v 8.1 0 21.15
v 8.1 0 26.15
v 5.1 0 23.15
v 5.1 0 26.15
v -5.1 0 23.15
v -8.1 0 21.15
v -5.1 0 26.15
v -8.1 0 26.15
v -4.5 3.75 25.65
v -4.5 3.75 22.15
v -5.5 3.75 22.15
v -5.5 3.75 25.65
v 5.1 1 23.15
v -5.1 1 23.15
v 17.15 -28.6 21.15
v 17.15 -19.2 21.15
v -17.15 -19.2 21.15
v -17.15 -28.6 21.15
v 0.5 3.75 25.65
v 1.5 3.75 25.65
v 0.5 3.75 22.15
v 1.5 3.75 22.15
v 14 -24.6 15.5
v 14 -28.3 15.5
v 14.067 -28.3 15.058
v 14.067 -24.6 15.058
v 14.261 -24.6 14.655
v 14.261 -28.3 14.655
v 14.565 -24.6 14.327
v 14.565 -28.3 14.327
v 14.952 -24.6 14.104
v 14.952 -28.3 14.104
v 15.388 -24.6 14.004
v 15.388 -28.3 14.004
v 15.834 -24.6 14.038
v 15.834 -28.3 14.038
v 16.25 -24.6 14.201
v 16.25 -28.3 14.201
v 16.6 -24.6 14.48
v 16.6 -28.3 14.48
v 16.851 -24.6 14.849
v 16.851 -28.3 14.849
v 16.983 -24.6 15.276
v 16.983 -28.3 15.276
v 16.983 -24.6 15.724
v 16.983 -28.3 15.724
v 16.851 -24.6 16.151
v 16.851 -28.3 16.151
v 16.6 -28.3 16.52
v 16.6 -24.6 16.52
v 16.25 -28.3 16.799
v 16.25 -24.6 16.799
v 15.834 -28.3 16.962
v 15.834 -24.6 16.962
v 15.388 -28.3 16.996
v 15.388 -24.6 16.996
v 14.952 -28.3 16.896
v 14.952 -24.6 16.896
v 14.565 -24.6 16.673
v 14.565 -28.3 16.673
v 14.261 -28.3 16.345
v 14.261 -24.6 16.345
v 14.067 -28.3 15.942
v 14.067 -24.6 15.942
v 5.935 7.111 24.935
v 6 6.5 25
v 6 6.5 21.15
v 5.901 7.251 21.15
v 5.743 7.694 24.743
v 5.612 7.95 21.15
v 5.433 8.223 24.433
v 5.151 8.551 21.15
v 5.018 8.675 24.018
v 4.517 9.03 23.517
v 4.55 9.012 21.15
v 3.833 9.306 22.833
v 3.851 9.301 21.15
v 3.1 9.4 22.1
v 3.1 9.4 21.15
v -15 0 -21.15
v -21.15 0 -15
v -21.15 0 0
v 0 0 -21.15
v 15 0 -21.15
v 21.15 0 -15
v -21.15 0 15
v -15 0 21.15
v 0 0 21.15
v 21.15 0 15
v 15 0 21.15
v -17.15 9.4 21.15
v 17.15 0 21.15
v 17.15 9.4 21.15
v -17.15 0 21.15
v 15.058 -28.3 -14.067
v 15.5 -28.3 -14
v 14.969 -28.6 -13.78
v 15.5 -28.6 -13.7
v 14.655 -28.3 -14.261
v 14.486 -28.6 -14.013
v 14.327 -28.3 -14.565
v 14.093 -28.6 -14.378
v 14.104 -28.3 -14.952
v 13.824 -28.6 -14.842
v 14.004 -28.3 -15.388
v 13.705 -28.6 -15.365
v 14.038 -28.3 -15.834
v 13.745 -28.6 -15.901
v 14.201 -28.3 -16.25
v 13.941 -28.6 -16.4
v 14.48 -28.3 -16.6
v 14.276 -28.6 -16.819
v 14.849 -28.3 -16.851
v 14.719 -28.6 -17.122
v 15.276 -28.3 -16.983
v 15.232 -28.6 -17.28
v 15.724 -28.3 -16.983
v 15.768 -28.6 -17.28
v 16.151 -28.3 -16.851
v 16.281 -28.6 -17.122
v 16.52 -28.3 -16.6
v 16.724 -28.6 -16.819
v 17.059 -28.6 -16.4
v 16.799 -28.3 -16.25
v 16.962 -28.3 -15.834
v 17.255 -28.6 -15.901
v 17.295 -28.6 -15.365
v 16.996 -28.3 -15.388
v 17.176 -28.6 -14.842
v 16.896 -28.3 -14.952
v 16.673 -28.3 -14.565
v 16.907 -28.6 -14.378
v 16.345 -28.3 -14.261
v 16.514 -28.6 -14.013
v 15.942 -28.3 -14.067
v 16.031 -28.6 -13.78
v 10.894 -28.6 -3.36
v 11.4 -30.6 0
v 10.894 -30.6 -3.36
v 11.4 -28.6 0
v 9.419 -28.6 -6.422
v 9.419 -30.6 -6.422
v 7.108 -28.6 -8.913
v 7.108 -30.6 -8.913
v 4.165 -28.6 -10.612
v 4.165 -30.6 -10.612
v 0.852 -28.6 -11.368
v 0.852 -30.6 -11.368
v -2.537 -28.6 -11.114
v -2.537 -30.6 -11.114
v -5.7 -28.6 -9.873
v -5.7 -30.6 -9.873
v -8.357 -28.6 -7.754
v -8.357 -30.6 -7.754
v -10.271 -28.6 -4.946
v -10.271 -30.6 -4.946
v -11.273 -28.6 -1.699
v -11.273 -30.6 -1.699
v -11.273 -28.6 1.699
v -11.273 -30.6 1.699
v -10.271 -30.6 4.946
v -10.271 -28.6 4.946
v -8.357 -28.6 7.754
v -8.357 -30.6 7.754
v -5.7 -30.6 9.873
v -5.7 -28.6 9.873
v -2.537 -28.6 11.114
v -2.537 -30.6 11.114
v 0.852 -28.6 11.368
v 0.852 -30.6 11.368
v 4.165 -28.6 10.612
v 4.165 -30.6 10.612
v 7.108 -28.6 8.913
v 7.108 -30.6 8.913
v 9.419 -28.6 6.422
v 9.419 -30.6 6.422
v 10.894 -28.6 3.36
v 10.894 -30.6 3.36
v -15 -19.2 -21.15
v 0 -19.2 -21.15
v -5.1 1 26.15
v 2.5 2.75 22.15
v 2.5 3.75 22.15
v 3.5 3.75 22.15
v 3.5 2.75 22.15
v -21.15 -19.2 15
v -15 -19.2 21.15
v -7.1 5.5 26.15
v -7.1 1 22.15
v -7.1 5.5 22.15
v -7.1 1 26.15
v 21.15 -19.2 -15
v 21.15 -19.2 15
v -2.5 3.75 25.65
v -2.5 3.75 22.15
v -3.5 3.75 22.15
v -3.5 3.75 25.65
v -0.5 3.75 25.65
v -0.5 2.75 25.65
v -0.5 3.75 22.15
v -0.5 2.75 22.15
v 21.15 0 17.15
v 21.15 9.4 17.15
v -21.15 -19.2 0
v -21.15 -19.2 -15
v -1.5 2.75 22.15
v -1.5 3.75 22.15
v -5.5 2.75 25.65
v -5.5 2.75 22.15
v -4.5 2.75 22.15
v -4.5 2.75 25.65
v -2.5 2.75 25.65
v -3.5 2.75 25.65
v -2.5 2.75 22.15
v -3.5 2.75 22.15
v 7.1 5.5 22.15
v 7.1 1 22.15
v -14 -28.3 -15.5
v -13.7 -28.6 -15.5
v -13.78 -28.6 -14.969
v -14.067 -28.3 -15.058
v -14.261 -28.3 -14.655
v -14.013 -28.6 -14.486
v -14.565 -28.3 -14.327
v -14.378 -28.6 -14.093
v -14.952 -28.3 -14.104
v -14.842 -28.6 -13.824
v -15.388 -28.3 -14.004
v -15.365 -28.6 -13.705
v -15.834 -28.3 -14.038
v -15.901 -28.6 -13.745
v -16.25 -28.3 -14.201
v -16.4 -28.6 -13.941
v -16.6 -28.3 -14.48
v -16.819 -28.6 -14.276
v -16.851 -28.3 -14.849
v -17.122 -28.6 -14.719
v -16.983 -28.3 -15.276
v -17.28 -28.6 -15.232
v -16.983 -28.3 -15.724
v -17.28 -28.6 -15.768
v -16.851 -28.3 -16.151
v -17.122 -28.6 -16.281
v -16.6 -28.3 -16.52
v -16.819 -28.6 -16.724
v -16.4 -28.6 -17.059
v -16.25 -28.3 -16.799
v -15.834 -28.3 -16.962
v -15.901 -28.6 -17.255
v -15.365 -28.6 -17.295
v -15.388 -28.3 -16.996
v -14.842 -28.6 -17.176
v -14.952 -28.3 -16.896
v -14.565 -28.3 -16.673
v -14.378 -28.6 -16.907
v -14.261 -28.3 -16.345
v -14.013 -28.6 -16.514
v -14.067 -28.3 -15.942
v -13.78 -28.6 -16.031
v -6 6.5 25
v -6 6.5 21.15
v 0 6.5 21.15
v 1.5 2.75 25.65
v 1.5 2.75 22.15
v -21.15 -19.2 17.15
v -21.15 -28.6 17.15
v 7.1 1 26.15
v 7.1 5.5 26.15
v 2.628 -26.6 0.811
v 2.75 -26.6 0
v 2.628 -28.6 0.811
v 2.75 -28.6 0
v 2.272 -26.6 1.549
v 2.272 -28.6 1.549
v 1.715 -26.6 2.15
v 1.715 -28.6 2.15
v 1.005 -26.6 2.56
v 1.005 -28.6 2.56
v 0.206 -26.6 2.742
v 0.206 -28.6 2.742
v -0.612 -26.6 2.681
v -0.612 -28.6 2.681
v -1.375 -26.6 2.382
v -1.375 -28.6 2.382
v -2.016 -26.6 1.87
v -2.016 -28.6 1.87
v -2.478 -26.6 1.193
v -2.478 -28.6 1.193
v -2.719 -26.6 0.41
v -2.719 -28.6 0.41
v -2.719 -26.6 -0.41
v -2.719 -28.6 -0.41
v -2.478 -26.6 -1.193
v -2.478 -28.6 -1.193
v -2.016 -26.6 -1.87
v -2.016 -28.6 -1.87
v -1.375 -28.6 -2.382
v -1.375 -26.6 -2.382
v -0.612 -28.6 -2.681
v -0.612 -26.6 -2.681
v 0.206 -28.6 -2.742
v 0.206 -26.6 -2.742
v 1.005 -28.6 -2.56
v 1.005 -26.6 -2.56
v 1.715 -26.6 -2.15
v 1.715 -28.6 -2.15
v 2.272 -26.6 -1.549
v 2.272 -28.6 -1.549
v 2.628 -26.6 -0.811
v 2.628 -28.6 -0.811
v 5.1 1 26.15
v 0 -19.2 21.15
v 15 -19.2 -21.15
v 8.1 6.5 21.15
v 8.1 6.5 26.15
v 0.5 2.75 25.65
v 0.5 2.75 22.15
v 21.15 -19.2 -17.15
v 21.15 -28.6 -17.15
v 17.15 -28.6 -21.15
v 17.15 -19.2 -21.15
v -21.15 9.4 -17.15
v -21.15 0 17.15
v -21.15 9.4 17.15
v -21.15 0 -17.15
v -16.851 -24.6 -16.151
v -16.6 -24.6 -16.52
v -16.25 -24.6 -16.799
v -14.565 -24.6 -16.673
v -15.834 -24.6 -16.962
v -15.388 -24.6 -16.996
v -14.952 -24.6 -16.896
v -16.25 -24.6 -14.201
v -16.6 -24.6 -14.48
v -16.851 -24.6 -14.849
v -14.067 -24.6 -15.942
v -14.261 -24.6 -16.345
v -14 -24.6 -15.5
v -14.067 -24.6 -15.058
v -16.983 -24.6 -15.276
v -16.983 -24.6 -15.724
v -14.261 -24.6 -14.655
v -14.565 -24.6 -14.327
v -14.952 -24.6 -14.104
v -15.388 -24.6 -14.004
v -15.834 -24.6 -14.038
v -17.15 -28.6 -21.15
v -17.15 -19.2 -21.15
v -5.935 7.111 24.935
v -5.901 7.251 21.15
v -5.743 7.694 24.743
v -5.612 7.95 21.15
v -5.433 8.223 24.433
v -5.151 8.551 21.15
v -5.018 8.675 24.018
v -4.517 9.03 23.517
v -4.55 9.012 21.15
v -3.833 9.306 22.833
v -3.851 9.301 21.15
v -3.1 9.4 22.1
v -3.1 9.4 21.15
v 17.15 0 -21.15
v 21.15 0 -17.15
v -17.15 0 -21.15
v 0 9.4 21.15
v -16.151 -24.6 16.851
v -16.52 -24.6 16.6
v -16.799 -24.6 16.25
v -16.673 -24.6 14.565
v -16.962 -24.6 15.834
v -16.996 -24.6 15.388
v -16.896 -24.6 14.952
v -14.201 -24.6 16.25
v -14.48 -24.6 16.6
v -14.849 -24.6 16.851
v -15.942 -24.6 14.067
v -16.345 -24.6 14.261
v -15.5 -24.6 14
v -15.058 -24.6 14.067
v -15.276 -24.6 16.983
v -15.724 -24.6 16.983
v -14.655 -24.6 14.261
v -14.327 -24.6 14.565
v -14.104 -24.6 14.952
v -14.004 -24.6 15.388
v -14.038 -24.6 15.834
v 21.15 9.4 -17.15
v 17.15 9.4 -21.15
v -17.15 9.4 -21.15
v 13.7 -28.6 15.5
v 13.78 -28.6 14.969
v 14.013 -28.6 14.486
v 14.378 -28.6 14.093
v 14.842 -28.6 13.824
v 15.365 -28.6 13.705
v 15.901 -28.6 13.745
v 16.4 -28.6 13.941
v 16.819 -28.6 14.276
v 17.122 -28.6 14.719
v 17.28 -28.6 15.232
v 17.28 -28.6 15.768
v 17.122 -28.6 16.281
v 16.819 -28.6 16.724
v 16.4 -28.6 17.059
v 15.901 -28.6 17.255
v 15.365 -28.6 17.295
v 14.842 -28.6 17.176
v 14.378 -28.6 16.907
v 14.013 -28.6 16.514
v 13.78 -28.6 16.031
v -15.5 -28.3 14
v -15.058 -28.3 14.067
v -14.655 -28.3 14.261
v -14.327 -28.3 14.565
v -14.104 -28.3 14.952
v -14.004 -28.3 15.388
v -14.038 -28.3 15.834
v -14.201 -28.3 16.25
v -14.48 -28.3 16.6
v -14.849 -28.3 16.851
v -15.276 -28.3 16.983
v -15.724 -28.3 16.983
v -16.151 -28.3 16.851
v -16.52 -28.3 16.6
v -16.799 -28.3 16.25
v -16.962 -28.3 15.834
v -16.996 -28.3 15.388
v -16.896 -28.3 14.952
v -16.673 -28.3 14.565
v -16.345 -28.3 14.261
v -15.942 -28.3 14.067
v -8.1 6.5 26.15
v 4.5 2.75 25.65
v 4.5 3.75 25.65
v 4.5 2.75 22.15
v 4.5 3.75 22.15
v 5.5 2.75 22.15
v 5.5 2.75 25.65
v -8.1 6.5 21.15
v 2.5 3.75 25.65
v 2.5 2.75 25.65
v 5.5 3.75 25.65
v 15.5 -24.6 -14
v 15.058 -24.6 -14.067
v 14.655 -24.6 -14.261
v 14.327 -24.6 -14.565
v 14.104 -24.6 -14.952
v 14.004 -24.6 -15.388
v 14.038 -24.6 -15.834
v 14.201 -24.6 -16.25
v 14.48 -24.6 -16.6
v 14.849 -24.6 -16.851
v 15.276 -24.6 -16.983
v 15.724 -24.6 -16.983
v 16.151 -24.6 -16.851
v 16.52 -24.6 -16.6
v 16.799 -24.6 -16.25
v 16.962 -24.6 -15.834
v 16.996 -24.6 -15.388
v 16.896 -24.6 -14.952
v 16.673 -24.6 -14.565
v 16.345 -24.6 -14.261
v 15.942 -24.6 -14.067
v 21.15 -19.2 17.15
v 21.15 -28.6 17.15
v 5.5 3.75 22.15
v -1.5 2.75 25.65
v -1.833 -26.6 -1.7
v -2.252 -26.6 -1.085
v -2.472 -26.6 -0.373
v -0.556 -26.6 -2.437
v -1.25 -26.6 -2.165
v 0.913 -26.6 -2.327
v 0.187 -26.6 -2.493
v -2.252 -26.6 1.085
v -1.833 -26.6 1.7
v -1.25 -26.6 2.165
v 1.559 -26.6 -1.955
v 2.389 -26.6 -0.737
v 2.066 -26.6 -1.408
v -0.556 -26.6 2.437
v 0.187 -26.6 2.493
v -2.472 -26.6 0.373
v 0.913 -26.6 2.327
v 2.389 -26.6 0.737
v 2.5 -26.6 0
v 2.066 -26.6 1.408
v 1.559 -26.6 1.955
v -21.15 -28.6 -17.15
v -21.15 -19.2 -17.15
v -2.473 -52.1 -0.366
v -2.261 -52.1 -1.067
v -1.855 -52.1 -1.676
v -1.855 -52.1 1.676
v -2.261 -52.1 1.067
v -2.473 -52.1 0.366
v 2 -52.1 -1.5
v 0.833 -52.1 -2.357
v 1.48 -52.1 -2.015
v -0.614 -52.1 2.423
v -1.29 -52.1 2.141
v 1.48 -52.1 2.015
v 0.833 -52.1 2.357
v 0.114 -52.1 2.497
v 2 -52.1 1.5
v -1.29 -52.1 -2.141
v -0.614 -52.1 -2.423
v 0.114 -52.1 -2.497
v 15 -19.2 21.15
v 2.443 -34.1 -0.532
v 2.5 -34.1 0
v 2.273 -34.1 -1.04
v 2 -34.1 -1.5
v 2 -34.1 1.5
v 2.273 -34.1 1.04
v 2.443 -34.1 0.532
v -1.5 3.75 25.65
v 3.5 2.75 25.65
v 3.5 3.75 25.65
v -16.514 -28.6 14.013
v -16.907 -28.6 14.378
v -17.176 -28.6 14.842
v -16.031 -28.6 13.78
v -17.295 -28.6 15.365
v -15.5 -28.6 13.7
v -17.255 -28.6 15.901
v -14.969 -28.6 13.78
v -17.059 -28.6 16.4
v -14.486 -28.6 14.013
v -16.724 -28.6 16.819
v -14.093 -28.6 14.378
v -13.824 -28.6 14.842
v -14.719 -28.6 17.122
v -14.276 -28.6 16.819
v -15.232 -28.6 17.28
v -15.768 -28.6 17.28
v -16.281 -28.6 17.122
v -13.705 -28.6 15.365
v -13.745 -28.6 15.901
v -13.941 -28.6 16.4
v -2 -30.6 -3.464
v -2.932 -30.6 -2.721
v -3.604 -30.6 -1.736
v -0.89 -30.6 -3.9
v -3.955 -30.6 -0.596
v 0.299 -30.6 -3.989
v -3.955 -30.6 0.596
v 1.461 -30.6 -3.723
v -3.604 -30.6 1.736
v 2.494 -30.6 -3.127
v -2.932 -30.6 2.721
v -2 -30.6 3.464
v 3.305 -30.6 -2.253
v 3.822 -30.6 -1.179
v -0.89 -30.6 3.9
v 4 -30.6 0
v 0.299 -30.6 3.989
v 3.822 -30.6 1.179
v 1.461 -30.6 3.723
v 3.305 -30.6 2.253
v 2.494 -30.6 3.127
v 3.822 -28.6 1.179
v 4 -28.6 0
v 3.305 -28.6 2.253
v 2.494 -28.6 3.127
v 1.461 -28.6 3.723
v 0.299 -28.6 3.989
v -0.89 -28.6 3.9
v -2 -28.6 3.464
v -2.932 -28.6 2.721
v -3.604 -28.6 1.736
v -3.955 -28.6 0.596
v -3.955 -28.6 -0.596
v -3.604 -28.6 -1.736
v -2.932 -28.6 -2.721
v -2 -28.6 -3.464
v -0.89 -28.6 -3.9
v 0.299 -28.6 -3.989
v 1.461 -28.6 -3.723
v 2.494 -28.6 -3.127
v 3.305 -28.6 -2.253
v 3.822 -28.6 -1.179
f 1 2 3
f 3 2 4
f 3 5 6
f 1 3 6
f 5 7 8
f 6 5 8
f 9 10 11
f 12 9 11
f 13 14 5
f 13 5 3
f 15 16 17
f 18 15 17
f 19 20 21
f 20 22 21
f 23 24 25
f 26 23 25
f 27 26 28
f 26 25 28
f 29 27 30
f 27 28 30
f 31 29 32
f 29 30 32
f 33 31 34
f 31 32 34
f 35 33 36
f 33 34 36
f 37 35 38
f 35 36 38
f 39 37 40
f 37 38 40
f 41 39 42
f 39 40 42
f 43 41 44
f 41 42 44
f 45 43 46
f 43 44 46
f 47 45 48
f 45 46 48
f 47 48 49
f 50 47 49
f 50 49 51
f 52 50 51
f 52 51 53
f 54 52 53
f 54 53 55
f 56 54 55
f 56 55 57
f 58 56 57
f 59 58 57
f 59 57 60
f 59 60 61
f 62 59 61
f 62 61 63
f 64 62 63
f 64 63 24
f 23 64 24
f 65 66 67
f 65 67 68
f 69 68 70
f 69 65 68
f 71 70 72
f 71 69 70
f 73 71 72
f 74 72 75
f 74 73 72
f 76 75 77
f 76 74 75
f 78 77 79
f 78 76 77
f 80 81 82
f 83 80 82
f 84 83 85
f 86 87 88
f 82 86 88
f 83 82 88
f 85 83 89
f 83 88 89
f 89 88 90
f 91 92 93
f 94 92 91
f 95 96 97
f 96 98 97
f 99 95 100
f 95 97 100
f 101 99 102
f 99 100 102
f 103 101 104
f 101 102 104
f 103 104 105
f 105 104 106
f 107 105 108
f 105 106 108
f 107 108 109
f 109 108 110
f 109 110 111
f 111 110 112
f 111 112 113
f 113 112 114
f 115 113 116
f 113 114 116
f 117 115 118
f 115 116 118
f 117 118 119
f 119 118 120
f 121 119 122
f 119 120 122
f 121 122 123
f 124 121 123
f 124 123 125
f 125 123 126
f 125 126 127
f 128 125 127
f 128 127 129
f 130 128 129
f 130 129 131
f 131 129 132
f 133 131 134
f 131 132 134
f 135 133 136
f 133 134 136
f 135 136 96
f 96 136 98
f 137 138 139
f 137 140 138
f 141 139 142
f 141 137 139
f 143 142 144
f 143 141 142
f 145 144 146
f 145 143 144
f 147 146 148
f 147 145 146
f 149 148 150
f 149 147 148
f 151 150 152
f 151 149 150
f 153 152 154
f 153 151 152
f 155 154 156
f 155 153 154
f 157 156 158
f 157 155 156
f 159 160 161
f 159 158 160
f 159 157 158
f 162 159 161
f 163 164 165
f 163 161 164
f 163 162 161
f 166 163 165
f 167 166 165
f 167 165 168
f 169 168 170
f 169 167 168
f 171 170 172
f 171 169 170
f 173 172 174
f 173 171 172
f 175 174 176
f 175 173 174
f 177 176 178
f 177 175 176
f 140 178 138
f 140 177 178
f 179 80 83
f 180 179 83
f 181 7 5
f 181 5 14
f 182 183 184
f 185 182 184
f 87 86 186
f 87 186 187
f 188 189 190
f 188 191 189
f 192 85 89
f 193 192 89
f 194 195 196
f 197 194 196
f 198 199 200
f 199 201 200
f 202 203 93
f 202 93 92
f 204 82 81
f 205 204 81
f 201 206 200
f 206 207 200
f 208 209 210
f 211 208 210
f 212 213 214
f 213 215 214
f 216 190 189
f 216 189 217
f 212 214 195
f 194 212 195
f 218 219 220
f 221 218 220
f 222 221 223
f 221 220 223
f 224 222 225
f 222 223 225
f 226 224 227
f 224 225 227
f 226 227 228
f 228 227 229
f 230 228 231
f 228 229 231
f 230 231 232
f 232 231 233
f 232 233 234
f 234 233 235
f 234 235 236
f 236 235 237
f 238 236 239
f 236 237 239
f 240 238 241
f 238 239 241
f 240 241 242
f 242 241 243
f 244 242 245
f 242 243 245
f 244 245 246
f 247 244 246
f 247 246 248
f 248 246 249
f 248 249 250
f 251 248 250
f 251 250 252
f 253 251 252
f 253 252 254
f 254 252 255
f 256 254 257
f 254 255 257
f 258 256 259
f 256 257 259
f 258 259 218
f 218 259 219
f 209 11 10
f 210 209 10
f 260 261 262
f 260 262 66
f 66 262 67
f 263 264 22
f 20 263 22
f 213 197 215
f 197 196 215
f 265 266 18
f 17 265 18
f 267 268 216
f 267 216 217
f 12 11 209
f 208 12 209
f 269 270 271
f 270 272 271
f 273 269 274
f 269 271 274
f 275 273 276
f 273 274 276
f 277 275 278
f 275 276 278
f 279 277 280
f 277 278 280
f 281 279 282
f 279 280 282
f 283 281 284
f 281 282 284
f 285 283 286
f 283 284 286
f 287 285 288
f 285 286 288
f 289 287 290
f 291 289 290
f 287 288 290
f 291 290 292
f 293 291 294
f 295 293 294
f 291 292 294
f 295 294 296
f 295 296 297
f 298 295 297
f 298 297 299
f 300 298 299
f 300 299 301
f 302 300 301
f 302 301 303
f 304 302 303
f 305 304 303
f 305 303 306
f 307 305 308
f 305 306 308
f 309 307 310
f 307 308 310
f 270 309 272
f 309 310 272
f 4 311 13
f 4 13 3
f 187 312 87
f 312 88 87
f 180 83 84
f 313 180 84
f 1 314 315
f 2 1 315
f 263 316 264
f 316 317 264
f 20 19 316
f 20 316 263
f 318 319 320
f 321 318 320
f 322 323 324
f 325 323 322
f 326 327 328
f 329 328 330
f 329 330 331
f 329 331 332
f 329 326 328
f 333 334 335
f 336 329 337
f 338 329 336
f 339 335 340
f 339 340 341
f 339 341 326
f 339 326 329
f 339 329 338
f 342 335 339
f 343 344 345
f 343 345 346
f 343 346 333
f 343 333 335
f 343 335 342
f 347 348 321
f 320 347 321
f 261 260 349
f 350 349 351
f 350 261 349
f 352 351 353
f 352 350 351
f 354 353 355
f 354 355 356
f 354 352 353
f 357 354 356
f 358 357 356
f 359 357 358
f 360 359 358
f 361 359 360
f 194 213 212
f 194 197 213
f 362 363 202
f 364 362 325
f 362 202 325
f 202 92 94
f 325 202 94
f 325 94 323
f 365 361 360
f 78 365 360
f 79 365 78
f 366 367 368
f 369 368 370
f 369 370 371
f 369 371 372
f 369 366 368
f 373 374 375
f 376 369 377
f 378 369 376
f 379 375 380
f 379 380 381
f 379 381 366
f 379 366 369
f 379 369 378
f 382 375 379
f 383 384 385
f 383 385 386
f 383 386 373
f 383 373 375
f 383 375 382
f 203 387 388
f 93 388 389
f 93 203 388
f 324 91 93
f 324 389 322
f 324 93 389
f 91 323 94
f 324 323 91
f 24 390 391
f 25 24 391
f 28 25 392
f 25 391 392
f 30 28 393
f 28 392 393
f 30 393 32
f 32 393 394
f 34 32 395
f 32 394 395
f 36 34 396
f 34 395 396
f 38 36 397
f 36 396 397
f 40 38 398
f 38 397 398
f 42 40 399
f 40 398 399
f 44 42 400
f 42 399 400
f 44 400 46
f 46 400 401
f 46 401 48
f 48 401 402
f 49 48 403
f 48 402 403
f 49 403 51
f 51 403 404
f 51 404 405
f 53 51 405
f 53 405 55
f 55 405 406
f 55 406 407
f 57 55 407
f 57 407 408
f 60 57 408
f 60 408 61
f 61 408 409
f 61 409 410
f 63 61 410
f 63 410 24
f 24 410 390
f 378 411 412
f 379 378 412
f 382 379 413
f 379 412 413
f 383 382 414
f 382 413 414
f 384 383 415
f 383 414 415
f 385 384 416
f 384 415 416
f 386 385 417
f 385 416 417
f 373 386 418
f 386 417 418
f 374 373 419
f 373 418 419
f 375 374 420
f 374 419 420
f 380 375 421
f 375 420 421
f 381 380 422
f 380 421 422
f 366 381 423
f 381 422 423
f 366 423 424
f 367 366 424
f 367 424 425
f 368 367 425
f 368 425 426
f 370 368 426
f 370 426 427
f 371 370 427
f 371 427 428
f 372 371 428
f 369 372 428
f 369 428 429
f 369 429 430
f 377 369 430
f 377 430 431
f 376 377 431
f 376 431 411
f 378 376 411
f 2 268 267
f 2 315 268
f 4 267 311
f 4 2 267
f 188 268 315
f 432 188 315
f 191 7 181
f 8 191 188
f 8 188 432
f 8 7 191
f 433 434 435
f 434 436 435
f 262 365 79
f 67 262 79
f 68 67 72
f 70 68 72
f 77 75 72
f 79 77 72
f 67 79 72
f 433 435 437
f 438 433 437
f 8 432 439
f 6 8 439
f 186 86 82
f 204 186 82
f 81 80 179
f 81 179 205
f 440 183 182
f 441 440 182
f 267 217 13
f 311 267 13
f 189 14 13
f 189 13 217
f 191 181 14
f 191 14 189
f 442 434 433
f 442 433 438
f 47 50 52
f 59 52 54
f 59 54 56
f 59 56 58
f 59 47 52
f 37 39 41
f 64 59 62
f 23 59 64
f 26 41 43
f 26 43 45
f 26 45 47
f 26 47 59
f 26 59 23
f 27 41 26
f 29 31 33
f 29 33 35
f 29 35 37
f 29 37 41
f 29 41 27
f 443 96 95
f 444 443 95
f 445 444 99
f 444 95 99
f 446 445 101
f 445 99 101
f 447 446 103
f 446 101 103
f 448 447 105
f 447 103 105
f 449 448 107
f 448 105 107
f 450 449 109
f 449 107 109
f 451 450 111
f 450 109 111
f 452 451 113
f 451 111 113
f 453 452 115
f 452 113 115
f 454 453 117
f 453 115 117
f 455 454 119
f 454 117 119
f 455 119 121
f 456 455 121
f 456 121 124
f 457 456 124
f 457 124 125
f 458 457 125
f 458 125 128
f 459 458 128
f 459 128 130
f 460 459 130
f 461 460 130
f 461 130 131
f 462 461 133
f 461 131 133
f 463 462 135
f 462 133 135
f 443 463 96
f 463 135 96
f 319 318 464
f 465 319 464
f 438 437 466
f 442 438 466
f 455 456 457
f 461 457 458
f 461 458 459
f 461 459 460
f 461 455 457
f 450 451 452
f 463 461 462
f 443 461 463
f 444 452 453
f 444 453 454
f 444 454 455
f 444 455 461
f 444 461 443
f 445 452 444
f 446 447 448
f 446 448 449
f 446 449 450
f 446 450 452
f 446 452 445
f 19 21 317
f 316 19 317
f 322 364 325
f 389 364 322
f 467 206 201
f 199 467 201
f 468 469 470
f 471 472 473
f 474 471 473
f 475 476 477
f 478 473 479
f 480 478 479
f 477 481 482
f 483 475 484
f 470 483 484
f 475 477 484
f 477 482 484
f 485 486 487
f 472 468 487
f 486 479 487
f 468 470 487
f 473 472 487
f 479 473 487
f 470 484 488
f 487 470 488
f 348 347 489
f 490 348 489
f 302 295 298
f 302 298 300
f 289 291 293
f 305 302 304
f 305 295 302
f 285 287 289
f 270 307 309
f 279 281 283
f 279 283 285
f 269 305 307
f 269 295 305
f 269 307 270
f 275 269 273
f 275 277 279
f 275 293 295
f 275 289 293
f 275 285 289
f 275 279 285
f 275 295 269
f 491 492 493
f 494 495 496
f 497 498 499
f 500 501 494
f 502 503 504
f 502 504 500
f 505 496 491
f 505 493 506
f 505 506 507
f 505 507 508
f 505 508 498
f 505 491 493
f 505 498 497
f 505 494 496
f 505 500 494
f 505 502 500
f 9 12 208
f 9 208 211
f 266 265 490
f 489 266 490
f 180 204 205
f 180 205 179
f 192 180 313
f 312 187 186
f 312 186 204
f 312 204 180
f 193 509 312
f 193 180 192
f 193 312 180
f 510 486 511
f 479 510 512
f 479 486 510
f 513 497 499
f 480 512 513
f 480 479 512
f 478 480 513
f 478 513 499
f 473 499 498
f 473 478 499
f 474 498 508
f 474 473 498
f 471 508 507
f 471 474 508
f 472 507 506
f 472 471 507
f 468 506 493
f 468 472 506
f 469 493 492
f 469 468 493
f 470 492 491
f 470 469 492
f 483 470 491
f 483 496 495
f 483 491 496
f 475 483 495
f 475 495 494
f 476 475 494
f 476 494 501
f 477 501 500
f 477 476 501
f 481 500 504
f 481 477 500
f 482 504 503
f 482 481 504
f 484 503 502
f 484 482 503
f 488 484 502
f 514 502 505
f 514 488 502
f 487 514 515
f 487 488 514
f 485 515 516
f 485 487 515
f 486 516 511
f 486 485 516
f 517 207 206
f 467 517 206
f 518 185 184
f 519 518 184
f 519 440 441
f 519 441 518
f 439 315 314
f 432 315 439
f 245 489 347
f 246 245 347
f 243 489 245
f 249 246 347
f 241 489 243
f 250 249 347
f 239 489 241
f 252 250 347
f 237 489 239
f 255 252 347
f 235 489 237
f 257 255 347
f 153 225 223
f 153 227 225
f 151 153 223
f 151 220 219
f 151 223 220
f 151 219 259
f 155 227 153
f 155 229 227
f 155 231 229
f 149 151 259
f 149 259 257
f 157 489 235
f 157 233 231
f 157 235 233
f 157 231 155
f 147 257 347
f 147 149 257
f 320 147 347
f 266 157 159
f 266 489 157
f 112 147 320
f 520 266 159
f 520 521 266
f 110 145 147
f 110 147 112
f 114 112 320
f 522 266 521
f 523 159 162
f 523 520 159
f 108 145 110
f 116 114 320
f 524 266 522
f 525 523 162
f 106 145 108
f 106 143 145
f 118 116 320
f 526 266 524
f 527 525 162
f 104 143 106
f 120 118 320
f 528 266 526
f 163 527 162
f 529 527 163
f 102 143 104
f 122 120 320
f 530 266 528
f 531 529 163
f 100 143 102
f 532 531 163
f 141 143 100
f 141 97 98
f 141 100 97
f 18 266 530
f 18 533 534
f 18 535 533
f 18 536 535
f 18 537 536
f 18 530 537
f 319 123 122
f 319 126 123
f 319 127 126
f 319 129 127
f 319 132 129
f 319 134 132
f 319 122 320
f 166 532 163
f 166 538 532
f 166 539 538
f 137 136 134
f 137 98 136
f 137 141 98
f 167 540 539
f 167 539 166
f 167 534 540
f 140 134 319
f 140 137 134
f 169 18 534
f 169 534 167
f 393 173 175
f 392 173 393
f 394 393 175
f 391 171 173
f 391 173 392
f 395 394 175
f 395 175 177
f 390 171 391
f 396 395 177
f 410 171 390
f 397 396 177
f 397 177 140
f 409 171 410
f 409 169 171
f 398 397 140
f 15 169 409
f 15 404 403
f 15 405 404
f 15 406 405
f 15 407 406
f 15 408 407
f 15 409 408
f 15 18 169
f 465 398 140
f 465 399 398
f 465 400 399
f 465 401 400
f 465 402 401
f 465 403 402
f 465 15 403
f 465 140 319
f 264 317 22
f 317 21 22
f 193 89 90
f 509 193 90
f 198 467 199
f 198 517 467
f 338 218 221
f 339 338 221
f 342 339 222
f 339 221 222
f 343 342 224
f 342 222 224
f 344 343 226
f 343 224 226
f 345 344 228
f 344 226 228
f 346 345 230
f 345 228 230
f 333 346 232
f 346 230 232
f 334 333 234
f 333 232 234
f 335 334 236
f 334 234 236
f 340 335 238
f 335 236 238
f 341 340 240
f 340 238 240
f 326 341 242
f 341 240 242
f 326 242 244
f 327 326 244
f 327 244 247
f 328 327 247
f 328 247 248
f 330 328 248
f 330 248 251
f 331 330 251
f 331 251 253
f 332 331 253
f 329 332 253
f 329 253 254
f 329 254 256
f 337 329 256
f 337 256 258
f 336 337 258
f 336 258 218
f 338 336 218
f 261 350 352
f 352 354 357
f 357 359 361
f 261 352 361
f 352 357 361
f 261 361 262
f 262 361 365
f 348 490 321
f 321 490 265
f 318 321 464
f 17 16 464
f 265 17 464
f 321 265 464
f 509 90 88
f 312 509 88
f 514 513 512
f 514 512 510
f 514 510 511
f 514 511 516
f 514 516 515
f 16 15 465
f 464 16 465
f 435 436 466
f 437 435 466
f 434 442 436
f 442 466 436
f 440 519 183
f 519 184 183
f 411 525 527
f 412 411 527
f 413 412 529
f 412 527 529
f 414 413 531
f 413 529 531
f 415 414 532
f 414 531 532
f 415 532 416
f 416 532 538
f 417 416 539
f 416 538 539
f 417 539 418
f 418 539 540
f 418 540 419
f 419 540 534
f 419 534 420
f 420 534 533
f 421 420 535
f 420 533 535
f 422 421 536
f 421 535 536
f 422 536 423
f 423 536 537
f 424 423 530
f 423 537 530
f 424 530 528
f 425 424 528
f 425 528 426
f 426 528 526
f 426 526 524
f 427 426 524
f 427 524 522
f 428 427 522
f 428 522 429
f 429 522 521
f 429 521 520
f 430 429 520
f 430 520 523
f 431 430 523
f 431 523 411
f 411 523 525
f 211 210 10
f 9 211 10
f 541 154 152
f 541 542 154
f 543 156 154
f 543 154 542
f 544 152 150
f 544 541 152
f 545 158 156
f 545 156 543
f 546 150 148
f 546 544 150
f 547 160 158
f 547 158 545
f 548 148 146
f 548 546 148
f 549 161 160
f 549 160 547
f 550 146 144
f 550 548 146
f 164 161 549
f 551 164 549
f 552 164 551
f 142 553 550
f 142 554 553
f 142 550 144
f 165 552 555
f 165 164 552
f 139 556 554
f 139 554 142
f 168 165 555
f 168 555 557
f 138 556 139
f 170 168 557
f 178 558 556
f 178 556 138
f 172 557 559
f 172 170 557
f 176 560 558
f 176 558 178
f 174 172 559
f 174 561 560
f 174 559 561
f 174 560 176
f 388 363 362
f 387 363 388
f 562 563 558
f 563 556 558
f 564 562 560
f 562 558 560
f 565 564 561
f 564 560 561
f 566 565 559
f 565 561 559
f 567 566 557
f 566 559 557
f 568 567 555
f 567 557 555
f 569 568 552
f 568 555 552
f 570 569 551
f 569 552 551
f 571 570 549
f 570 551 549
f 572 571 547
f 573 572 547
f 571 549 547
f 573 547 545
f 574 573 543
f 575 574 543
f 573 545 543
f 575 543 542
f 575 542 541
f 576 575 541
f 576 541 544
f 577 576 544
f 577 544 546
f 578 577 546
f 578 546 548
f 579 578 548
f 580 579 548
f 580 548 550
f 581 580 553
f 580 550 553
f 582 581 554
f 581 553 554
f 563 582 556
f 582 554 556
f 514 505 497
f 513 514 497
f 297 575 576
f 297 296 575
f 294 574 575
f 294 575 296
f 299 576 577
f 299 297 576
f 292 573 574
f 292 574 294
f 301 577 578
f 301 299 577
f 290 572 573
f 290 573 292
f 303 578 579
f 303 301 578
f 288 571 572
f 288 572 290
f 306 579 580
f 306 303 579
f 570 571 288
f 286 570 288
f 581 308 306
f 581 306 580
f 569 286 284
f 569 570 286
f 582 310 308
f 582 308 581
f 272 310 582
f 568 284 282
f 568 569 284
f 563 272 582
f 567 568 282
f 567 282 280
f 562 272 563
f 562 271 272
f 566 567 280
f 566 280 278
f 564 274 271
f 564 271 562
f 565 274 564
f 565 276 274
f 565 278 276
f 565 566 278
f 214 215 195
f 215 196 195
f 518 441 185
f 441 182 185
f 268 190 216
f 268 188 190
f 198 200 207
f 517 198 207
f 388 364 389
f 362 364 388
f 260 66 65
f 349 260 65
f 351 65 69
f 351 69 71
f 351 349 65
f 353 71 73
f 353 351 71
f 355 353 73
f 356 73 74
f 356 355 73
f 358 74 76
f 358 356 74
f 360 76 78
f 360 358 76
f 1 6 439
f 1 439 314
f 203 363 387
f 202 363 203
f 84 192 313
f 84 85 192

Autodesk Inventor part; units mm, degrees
ref_plane "YZ Plane" through (0, 0, 0) normal (1, 0, 0) x (0, 1, 0)
ref_plane "XZ Plane" through (0, 0, 0) normal (0, 1, 0) x (-1, 0, 0)
ref_plane "XY Plane" through (0, 0, 0) normal (0, 0, 1) x (1, 0, 0)
sketch "Szkic1" plane through (0, 0, 0) normal (0, 1, 0) x (-1, 0, 0)
  line L0 (-21.15, 21.15) -> (21.15, 21.15)
  line L1 (21.15, 21.15) -> (21.15, -21.15)
  line L2 (21.15, -21.15) -> (-21.15, -21.15)
  line L3 (-21.15, -21.15) -> (-21.15, 21.15)
  line L4 (-21.15, 21.15) -> (21.15, -21.15) construction
  line L5 (21.15, 21.15) -> (-21.15, -21.15) construction
  point P0 (0, 0)
  dimension "d0" = 42.3
  dimension "d1" = 42.3
extrude "Wyciągnięcie proste1" add sketch "Szkic1" along normal blind 9.4
chamfer "Faza1" distance 4 angle 45 4 edges at (21.15, 4.7, 21.15) (-21.15, 4.7, 21.15) (-21.15, 4.7, -21.15) (21.15, 4.7, -21.15)
sketch "Szkic2" plane through (0, 0, 0) normal (0, -1, 0) x (1, 0, 0)
  line L0 (21.15, -17.15) -> (17.15, -21.15) projected
  line L1 (21.15, -17.15) -> (21.15, 17.15) projected
  line L2 (17.15, 21.15) -> (21.15, 17.15) projected
  line L3 (17.15, 21.15) -> (-17.15, 21.15) projected
  line L4 (-21.15, 17.15) -> (-17.15, 21.15) projected
  line L5 (-21.15, 17.15) -> (-21.15, -17.15) projected
  line L6 (-17.15, -21.15) -> (-21.15, -17.15) projected
  line L7 (-17.15, -21.15) -> (17.15, -21.15) projected
  line L8 (21.15, -17.15) -> (21.15, 17.15) projected
  line L9 (21.15, 15) -> (21.15, -15)
  line L10 (17.15, -21.15) -> (-17.15, -21.15) projected
  line L11 (0, -21.15) -> (15, -21.15)
  line L12 (0, -21.15) -> (-15, -21.15)
  line L13 (-21.15, -17.15) -> (-21.15, 17.15) projected
  line L14 (-21.15, 0) -> (-21.15, -15)
  line L15 (-21.15, 0) -> (-21.15, 15)
  line L16 (-17.15, 21.15) -> (17.15, 21.15) projected
  line L17 (0, 21.15) -> (-15, 21.15)
  line L18 (0, 21.15) -> (15, 21.15)
  line L19 (21.15, 15) -> (15, 21.15)
  line L20 (21.15, -15) -> (15, -21.15)
  line L21 (-15, -21.15) -> (-21.15, -15)
  line L22 (-21.15, 15) -> (-15, 21.15)
  point P0 (0, 0)
extrude "Wyciągnięcie proste2" add sketch "Szkic2" along normal blind 19.2 separate body contours L20 L7 L21 L5 L22 L3 L19 L1
sketch "Szkic3" plane through (0, -19.2, 0) normal (0, -1, 0) x (1, 0, 0)
  line L0 (21.15, -17.15) -> (17.15, -21.15) projected
  line L1 (21.15, -17.15) -> (21.15, 17.15) projected
  line L2 (17.15, 21.15) -> (21.15, 17.15) projected
  line L3 (17.15, 21.15) -> (-17.15, 21.15) projected
  line L4 (-21.15, 17.15) -> (-17.15, 21.15) projected
  line L5 (-21.15, 17.15) -> (-21.15, -17.15) projected
  line L6 (-17.15, -21.15) -> (-21.15, -17.15) projected
  line L7 (-17.15, -21.15) -> (17.15, -21.15) projected
  point P0 (0, 0)
extrude "Wyciągnięcie proste3" add sketch "Szkic3" along normal blind 9.4 separate body
sketch "Szkic4" plane through (0, -28.6, 0) normal (0, -1, 0) x (1, 0, 0)
  circle A0 centre (0, 0) radius 11.4
  dimension "d11" = 22.8
extrude "Wyciągnięcie proste4" add sketch "Szkic4" along normal blind 2 bodies 3
sketch "Szkic5" plane through (0, -30.6, 0) normal (0, -1, 0) x (1, 0, 0)
  circle A0 centre (0, 0) radius 4
  dimension "d14" = 8
extrude "Wyciągnięcie proste5" cut sketch "Szkic5" against normal blind 2 bodies 3
sketch "Szkic6" plane through (0, -28.6, 0) normal (0, -1, 0) x (1, 0, 0)
  circle A0 centre (0, 0) radius 2.75
  dimension "d17" = 5.5
extrude "Wyciągnięcie proste6" cut sketch "Szkic6" against normal blind 2 bodies 3
sketch "Szkic7" plane through (0, -26.6, 0) normal (0, -1, 0) x (1, 0, 0)
  circle A0 centre (0, 0) radius 2.5
  dimension "d20" = 5
extrude "Wyciągnięcie proste7" add sketch "Szkic7" along normal blind 25.5 separate body
sketch "Szkic8" plane through (0, -52.1, 0) normal (0, -1, 0) x (1, 0, 0)
  circle A0 centre (0, 0) radius 2.5 projected
  line L0 (2, 1.5) -> (2, -1.5)
  dimension "d23" = 4.5
extrude "Wyciągnięcie proste8" cut sketch "Szkic8" against normal blind 18 contours A0 L0 picked at (2.0912, -0.3466) bodies 4
sketch "Szkic9" plane through (0, -28.6, 0) normal (0, -1, 0) x (1, 0, 0)
  circle A0 centre (-15.5, -15.5) radius 1.5
  arc A1 (2, 1.5) -> (2, -1.5) centre (0, 0) ccw projected
  dimension "d26" = 3
  dimension "d27" = 15.5
  dimension "d28" = 15.5
extrude "Wyciągnięcie proste9" cut sketch "Szkic9" against normal blind 4 bodies 3
pattern_circular "Szyk kołowy1" count 4 over 360 about axis through (0, -26.6, 0) along (0, -1, 0) of "Wyciągnięcie proste9" bodies 3
thread "Gwint1" size "M3x0.5" class "6H" standard "ANSI Metric M Profile" full length
thread "Gwint2" size "M3x0.5" class "6H" standard "ANSI Metric M Profile" full length
thread "Gwint3" size "M3x0.5" class "6H" standard "ANSI Metric M Profile" full length
thread "Gwint4" size "M3x0.5" class "6H" standard "ANSI Metric M Profile" full length
chamfer "Faza2" distance 0.3 angle 45 4 edges at (-17, -28.6, -15.5) (-15.5, -28.6, 17) (15.5, -28.6, -17) (17, -28.6, 15.5)
sketch "Szkic10" plane through (0, 0, 0) normal (0, 1, 0) x (-1, 0, 0)
  line L0 (17.15, 21.15) -> (-17.15, 21.15) projected
  line L1 (0, 21.15) -> (-8.1, 21.15)
  line L2 (-8.1, 21.15) -> (-8.1, 26.15)
  line L3 (-8.1, 26.15) -> (8.1, 26.15)
  line L4 (8.1, 26.15) -> (8.1, 21.15)
  line L5 (0, 21.15) -> (8.1, 21.15)
  point P0 (0, 0)
  dimension "d45" = 8.1
  dimension "d46" = 5
  dimension "d47" = 16.2
extrude "Wyciągnięcie proste10" add sketch "Szkic10" along normal blind 6.5 separate body
sketch "Szkic11" plane through (0, 9.4, 0) normal (0, 1, 0) x (1, 0, 0)
  line L0 (-17.15, -21.15) -> (17.15, -21.15) projected
  line L1 (0, -21.15) -> (6, -21.15)
  line L2 (6, -21.15) -> (6, -25)
  line L3 (6, -25) -> (-6, -25)
  line L4 (-6, -25) -> (-6, -21.15)
  line L5 (-6, -21.15) -> (0, -21.15)
  point P0 (0, 0)
  dimension "d50" = 3.85
  dimension "d51" = 12
  dimension "d52" = 11.15
extrude "Wyciągnięcie proste11" add sketch "Szkic11" against normal blind 2.9 separate body
fillet "Zaokrąglenie1" radius 2.9 3 edges at (6, 9.4, 23.075) (0, 9.4, 25) (-6, 9.4, 23.075)
sketch "Szkic12" plane through (-8.1, 0, 26.15) normal (0, 0, 1) x (1, 0, 0)
  line L0 (0, 0) -> (16.2, 0) projected
  line L1 (16.2, 0) -> (16.2, 6.5) projected
  line L2 (0, 6.5) -> (16.2, 6.5) projected
  line L3 (0, 0) -> (0, 6.5) projected
  line L4 (15.2, 1) -> (1, 1)
  line L5 (1, 1) -> (1, 5.5)
  line L6 (1, 5.5) -> (15.2, 5.5)
  line L7 (15.2, 5.5) -> (15.2, 1)
  point P0 (8.1, 0)
  dimension "d56" = 1
extrude "Wyciągnięcie proste12" cut sketch "Szkic12" against normal blind 4 contours L4 L5 L6 L7 bodies 5
sketch "Szkic13" plane through (-8.1, 0, 26.15) normal (0, 0, 1) x (1, 0, 0)
  line L0 (0, 0) -> (16.2, 0) projected
  line L1 (-6.9, 0) -> (23.1, 0) projected
  line L2 (15.2, 1) -> (1, 1) projected
  line L3 (13.2, 0) -> (3, 0)
  line L4 (3, 0) -> (3, 1)
  line L5 (3, 1) -> (13.2, 1)
  line L6 (13.2, 1) -> (13.2, 0)
  line L7 (15.2, 5.5) -> (15.2, 1) projected
  line L8 (1, 1) -> (1, 5.5) projected
  point P0 (8.1, 0)
  dimension "d59" = 2
  dimension "d60" = 2
extrude "Wyciągnięcie proste13" cut sketch "Szkic13" against normal blind 3 bodies 5
sketch "Szkic14" plane through (-8.1, 0, 22.15) normal (0, 0, 1) x (1, 0, 0)
  line L0 (15.2, 1) -> (13.2, 1) projected
  line L1 (15.2, 5.5) -> (15.2, 1) projected
  line L2 (15.2, 1) -> (1, 1) projected
  line L3 (15.2, 5.5) -> (15.2, 1) projected
  line L4 (1, 5.5) -> (15.2, 5.5) projected
  line L5 (1, 1) -> (1, 5.5) projected
  line L6 (15.2, 3.25) -> (1, 3.25)
  line L7 (13.6, 3.75) -> (12.6, 3.75)
  line L8 (12.6, 3.75) -> (12.6, 2.75)
  line L9 (12.6, 2.75) -> (13.6, 2.75)
  line L10 (13.6, 2.75) -> (13.6, 3.75)
  line L11 (13.6, 3.75) -> (12.6, 2.75) construction
  line L12 (12.6, 3.75) -> (13.6, 2.75) construction
  point P0 (8.1, 0)
  point P1 (13.1, 3.25)
  dimension "d63" = 1
  dimension "d64" = 2.1
  dimension "d65" = 1
extrude "Wyciągnięcie proste14" add sketch "Szkic14" along normal blind 3.5 separate body contours L10 L9 L8 L6 | L6 L8 L7 L10
pattern_linear "Szyk prostokątny1" count 6 spacing 2 along (-1, 0, 0) of "Wyciągnięcie proste14" bodies 7
properties part number "Nema_17"
